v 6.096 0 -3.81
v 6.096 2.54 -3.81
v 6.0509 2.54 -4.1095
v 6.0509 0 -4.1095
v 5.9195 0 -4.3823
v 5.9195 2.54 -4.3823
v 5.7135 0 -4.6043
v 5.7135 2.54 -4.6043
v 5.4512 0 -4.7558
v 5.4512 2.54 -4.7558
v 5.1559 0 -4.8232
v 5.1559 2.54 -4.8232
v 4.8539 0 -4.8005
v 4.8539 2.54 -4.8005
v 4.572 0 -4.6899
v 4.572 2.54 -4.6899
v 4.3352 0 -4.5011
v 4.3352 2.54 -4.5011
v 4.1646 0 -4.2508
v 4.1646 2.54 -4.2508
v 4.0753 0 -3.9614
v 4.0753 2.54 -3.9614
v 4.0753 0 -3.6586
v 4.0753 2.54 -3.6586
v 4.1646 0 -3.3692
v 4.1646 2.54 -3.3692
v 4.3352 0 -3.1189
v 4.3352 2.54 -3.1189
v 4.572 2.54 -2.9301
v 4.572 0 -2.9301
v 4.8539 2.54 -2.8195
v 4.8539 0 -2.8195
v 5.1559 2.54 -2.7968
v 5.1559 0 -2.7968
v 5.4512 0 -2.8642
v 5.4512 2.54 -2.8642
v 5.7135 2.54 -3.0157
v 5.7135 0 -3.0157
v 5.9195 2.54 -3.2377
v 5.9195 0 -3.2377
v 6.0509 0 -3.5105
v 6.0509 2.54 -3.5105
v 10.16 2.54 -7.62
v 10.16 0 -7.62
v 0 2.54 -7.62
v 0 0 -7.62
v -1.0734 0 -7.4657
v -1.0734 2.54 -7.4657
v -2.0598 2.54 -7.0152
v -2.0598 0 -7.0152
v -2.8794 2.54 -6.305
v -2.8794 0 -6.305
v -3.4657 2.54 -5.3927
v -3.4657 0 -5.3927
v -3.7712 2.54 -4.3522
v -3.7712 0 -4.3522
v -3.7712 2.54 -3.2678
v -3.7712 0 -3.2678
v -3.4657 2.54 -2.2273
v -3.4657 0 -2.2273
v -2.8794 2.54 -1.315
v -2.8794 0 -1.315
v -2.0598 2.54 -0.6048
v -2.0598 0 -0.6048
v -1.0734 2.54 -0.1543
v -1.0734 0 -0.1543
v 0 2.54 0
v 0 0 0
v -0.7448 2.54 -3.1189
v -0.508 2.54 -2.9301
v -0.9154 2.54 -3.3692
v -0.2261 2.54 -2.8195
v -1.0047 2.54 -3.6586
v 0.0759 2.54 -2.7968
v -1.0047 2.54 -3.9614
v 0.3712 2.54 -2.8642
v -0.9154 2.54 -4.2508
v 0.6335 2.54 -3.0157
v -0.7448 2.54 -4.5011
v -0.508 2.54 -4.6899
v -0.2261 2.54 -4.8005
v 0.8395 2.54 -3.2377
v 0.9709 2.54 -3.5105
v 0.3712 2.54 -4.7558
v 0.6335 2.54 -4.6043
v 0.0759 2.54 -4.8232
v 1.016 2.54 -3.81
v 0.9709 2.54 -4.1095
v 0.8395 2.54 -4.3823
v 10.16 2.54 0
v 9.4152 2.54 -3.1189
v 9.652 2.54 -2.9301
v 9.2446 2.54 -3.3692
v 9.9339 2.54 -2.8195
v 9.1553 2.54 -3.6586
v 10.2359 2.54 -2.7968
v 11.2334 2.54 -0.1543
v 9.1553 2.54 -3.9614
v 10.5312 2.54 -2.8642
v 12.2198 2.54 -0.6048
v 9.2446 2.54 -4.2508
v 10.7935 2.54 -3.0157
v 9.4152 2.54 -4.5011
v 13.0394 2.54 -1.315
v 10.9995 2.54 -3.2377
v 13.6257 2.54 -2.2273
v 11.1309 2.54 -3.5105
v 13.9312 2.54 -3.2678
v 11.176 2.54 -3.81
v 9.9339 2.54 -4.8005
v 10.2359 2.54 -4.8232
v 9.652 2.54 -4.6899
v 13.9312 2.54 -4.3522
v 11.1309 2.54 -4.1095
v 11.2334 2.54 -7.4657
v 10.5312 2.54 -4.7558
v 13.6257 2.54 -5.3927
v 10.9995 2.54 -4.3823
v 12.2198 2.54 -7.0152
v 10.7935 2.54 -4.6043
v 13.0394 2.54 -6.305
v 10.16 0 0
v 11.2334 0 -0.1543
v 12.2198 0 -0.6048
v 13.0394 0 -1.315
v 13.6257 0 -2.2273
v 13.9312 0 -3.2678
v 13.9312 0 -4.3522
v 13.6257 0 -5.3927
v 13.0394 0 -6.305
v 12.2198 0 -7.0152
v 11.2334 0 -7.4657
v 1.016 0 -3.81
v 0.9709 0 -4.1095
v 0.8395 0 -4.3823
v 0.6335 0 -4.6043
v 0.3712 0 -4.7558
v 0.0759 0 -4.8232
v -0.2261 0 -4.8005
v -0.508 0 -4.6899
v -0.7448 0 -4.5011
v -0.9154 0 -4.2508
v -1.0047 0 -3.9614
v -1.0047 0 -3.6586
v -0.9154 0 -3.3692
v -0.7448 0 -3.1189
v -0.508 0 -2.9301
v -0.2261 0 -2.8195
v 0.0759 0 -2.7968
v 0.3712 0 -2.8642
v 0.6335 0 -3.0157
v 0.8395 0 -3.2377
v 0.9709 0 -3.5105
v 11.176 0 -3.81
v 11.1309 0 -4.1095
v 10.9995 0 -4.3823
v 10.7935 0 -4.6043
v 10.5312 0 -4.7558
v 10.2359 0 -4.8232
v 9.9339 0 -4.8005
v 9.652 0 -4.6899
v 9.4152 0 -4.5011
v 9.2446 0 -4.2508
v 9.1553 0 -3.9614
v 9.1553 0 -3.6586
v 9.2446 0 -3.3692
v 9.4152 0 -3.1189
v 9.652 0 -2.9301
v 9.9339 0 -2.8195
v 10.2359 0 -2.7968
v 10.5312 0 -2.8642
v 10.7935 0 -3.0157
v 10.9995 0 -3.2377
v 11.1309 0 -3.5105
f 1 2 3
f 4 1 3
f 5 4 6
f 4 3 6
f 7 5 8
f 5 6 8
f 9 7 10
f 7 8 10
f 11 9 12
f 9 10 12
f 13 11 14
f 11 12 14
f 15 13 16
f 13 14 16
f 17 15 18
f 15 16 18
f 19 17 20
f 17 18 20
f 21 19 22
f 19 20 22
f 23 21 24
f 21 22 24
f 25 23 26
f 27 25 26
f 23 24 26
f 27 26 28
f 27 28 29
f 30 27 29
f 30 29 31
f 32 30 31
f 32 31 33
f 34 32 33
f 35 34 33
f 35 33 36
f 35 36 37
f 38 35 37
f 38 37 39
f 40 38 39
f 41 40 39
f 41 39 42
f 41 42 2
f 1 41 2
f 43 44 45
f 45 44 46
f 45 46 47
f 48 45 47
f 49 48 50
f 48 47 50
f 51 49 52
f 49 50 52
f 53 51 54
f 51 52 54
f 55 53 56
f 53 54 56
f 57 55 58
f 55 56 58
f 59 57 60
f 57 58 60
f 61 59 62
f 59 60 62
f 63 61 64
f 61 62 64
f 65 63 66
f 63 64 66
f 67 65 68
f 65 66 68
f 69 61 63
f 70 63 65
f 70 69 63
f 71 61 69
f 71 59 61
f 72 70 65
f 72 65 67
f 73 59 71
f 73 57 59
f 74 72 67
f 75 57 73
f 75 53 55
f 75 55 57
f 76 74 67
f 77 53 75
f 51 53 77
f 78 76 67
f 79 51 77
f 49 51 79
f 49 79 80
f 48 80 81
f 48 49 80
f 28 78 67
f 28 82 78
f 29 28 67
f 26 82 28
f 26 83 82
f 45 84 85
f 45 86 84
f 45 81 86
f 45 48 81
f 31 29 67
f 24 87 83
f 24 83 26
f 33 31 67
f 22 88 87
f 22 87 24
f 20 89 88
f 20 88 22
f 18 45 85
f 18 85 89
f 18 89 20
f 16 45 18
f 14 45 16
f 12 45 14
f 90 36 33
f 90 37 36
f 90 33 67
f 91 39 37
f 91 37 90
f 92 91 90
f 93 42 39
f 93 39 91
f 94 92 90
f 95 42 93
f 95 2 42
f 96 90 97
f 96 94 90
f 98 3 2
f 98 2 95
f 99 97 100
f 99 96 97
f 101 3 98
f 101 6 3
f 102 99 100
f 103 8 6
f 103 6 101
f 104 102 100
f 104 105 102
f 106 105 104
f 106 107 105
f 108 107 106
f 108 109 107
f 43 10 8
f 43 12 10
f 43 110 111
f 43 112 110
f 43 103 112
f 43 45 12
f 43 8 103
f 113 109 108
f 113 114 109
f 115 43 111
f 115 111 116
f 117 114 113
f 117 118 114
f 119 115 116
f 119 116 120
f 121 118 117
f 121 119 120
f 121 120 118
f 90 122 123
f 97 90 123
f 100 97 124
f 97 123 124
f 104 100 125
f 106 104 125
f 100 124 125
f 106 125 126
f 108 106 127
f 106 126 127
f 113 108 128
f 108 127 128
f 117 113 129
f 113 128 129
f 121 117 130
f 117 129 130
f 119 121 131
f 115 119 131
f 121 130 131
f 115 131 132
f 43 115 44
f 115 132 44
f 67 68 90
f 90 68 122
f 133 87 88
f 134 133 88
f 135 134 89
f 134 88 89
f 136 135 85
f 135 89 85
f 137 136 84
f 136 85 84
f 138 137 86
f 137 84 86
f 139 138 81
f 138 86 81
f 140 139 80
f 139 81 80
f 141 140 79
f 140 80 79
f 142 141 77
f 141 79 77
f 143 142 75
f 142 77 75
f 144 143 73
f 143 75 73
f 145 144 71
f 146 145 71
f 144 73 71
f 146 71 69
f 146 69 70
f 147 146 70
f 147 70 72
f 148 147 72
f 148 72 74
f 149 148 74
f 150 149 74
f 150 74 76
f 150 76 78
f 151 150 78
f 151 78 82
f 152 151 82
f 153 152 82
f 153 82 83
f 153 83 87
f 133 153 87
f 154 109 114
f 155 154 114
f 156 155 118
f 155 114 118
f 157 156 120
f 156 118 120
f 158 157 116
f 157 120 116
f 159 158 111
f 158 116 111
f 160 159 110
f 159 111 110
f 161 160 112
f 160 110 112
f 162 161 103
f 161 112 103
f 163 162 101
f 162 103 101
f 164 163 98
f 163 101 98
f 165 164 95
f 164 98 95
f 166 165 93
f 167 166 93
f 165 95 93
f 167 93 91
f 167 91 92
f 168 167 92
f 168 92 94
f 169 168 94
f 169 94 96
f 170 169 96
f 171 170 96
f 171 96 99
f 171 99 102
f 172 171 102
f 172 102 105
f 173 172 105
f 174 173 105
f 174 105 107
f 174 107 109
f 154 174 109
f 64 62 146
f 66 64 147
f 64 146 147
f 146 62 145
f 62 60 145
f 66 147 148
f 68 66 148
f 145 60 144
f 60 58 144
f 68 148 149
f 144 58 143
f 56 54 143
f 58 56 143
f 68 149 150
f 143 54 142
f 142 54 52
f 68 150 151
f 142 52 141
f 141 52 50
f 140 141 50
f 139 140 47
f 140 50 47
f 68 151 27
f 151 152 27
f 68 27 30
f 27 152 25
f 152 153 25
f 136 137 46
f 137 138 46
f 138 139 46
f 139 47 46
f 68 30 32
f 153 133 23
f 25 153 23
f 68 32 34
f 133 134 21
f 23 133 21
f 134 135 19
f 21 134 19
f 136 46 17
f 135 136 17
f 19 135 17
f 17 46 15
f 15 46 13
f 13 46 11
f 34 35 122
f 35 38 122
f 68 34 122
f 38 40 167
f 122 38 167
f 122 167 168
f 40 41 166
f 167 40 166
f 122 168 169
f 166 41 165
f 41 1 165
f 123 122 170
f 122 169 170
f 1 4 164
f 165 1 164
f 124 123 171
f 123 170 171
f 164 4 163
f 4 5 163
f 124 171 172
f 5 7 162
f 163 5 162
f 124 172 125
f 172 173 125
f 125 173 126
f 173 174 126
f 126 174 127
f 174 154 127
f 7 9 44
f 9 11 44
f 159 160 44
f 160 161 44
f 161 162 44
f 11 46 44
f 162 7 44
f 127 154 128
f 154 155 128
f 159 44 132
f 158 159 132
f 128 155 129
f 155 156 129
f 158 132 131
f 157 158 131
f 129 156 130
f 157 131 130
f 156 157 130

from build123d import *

# Parameters (mm, degrees)
BOSS_EXTRUDE1_DEPTH = 2.54
SKETCH2_R           = 1.016
CUT_EXTRUDE1_DEPTH  = 3.54


with BuildPart() as part:
    # Sketch1 → Boss-Extrude1 (new body)
    with BuildSketch(Plane(origin=(0, 0, 0), x_dir=(1, 0, 0), z_dir=(0, 1, 0))):
        with BuildLine():
            Line((0, 0), (10.16, 0))
            ThreePointArc((10.16, 0), (13.97, 3.81), (10.16, 7.62))
            Line((10.16, 7.62), (0, 7.62))
            ThreePointArc((0, 7.62), (-3.81, 3.81), (0, 0))
        make_face()
    extrude(amount=BOSS_EXTRUDE1_DEPTH)

    # Sketch2 → Cut-Extrude1 (cut, through all)
    with BuildSketch(Plane(origin=(0, 2.54, 0), x_dir=(1, 0, 0), z_dir=(0, 1, 0))):
        with Locations((0, 3.81)):
            Circle(SKETCH2_R)
        with Locations((5.08, 3.81)):
            Circle(SKETCH2_R)
        with Locations((10.16, 3.81)):
            Circle(SKETCH2_R)
    extrude(amount=-CUT_EXTRUDE1_DEPTH, mode=Mode.SUBTRACT)


solid = part.part
